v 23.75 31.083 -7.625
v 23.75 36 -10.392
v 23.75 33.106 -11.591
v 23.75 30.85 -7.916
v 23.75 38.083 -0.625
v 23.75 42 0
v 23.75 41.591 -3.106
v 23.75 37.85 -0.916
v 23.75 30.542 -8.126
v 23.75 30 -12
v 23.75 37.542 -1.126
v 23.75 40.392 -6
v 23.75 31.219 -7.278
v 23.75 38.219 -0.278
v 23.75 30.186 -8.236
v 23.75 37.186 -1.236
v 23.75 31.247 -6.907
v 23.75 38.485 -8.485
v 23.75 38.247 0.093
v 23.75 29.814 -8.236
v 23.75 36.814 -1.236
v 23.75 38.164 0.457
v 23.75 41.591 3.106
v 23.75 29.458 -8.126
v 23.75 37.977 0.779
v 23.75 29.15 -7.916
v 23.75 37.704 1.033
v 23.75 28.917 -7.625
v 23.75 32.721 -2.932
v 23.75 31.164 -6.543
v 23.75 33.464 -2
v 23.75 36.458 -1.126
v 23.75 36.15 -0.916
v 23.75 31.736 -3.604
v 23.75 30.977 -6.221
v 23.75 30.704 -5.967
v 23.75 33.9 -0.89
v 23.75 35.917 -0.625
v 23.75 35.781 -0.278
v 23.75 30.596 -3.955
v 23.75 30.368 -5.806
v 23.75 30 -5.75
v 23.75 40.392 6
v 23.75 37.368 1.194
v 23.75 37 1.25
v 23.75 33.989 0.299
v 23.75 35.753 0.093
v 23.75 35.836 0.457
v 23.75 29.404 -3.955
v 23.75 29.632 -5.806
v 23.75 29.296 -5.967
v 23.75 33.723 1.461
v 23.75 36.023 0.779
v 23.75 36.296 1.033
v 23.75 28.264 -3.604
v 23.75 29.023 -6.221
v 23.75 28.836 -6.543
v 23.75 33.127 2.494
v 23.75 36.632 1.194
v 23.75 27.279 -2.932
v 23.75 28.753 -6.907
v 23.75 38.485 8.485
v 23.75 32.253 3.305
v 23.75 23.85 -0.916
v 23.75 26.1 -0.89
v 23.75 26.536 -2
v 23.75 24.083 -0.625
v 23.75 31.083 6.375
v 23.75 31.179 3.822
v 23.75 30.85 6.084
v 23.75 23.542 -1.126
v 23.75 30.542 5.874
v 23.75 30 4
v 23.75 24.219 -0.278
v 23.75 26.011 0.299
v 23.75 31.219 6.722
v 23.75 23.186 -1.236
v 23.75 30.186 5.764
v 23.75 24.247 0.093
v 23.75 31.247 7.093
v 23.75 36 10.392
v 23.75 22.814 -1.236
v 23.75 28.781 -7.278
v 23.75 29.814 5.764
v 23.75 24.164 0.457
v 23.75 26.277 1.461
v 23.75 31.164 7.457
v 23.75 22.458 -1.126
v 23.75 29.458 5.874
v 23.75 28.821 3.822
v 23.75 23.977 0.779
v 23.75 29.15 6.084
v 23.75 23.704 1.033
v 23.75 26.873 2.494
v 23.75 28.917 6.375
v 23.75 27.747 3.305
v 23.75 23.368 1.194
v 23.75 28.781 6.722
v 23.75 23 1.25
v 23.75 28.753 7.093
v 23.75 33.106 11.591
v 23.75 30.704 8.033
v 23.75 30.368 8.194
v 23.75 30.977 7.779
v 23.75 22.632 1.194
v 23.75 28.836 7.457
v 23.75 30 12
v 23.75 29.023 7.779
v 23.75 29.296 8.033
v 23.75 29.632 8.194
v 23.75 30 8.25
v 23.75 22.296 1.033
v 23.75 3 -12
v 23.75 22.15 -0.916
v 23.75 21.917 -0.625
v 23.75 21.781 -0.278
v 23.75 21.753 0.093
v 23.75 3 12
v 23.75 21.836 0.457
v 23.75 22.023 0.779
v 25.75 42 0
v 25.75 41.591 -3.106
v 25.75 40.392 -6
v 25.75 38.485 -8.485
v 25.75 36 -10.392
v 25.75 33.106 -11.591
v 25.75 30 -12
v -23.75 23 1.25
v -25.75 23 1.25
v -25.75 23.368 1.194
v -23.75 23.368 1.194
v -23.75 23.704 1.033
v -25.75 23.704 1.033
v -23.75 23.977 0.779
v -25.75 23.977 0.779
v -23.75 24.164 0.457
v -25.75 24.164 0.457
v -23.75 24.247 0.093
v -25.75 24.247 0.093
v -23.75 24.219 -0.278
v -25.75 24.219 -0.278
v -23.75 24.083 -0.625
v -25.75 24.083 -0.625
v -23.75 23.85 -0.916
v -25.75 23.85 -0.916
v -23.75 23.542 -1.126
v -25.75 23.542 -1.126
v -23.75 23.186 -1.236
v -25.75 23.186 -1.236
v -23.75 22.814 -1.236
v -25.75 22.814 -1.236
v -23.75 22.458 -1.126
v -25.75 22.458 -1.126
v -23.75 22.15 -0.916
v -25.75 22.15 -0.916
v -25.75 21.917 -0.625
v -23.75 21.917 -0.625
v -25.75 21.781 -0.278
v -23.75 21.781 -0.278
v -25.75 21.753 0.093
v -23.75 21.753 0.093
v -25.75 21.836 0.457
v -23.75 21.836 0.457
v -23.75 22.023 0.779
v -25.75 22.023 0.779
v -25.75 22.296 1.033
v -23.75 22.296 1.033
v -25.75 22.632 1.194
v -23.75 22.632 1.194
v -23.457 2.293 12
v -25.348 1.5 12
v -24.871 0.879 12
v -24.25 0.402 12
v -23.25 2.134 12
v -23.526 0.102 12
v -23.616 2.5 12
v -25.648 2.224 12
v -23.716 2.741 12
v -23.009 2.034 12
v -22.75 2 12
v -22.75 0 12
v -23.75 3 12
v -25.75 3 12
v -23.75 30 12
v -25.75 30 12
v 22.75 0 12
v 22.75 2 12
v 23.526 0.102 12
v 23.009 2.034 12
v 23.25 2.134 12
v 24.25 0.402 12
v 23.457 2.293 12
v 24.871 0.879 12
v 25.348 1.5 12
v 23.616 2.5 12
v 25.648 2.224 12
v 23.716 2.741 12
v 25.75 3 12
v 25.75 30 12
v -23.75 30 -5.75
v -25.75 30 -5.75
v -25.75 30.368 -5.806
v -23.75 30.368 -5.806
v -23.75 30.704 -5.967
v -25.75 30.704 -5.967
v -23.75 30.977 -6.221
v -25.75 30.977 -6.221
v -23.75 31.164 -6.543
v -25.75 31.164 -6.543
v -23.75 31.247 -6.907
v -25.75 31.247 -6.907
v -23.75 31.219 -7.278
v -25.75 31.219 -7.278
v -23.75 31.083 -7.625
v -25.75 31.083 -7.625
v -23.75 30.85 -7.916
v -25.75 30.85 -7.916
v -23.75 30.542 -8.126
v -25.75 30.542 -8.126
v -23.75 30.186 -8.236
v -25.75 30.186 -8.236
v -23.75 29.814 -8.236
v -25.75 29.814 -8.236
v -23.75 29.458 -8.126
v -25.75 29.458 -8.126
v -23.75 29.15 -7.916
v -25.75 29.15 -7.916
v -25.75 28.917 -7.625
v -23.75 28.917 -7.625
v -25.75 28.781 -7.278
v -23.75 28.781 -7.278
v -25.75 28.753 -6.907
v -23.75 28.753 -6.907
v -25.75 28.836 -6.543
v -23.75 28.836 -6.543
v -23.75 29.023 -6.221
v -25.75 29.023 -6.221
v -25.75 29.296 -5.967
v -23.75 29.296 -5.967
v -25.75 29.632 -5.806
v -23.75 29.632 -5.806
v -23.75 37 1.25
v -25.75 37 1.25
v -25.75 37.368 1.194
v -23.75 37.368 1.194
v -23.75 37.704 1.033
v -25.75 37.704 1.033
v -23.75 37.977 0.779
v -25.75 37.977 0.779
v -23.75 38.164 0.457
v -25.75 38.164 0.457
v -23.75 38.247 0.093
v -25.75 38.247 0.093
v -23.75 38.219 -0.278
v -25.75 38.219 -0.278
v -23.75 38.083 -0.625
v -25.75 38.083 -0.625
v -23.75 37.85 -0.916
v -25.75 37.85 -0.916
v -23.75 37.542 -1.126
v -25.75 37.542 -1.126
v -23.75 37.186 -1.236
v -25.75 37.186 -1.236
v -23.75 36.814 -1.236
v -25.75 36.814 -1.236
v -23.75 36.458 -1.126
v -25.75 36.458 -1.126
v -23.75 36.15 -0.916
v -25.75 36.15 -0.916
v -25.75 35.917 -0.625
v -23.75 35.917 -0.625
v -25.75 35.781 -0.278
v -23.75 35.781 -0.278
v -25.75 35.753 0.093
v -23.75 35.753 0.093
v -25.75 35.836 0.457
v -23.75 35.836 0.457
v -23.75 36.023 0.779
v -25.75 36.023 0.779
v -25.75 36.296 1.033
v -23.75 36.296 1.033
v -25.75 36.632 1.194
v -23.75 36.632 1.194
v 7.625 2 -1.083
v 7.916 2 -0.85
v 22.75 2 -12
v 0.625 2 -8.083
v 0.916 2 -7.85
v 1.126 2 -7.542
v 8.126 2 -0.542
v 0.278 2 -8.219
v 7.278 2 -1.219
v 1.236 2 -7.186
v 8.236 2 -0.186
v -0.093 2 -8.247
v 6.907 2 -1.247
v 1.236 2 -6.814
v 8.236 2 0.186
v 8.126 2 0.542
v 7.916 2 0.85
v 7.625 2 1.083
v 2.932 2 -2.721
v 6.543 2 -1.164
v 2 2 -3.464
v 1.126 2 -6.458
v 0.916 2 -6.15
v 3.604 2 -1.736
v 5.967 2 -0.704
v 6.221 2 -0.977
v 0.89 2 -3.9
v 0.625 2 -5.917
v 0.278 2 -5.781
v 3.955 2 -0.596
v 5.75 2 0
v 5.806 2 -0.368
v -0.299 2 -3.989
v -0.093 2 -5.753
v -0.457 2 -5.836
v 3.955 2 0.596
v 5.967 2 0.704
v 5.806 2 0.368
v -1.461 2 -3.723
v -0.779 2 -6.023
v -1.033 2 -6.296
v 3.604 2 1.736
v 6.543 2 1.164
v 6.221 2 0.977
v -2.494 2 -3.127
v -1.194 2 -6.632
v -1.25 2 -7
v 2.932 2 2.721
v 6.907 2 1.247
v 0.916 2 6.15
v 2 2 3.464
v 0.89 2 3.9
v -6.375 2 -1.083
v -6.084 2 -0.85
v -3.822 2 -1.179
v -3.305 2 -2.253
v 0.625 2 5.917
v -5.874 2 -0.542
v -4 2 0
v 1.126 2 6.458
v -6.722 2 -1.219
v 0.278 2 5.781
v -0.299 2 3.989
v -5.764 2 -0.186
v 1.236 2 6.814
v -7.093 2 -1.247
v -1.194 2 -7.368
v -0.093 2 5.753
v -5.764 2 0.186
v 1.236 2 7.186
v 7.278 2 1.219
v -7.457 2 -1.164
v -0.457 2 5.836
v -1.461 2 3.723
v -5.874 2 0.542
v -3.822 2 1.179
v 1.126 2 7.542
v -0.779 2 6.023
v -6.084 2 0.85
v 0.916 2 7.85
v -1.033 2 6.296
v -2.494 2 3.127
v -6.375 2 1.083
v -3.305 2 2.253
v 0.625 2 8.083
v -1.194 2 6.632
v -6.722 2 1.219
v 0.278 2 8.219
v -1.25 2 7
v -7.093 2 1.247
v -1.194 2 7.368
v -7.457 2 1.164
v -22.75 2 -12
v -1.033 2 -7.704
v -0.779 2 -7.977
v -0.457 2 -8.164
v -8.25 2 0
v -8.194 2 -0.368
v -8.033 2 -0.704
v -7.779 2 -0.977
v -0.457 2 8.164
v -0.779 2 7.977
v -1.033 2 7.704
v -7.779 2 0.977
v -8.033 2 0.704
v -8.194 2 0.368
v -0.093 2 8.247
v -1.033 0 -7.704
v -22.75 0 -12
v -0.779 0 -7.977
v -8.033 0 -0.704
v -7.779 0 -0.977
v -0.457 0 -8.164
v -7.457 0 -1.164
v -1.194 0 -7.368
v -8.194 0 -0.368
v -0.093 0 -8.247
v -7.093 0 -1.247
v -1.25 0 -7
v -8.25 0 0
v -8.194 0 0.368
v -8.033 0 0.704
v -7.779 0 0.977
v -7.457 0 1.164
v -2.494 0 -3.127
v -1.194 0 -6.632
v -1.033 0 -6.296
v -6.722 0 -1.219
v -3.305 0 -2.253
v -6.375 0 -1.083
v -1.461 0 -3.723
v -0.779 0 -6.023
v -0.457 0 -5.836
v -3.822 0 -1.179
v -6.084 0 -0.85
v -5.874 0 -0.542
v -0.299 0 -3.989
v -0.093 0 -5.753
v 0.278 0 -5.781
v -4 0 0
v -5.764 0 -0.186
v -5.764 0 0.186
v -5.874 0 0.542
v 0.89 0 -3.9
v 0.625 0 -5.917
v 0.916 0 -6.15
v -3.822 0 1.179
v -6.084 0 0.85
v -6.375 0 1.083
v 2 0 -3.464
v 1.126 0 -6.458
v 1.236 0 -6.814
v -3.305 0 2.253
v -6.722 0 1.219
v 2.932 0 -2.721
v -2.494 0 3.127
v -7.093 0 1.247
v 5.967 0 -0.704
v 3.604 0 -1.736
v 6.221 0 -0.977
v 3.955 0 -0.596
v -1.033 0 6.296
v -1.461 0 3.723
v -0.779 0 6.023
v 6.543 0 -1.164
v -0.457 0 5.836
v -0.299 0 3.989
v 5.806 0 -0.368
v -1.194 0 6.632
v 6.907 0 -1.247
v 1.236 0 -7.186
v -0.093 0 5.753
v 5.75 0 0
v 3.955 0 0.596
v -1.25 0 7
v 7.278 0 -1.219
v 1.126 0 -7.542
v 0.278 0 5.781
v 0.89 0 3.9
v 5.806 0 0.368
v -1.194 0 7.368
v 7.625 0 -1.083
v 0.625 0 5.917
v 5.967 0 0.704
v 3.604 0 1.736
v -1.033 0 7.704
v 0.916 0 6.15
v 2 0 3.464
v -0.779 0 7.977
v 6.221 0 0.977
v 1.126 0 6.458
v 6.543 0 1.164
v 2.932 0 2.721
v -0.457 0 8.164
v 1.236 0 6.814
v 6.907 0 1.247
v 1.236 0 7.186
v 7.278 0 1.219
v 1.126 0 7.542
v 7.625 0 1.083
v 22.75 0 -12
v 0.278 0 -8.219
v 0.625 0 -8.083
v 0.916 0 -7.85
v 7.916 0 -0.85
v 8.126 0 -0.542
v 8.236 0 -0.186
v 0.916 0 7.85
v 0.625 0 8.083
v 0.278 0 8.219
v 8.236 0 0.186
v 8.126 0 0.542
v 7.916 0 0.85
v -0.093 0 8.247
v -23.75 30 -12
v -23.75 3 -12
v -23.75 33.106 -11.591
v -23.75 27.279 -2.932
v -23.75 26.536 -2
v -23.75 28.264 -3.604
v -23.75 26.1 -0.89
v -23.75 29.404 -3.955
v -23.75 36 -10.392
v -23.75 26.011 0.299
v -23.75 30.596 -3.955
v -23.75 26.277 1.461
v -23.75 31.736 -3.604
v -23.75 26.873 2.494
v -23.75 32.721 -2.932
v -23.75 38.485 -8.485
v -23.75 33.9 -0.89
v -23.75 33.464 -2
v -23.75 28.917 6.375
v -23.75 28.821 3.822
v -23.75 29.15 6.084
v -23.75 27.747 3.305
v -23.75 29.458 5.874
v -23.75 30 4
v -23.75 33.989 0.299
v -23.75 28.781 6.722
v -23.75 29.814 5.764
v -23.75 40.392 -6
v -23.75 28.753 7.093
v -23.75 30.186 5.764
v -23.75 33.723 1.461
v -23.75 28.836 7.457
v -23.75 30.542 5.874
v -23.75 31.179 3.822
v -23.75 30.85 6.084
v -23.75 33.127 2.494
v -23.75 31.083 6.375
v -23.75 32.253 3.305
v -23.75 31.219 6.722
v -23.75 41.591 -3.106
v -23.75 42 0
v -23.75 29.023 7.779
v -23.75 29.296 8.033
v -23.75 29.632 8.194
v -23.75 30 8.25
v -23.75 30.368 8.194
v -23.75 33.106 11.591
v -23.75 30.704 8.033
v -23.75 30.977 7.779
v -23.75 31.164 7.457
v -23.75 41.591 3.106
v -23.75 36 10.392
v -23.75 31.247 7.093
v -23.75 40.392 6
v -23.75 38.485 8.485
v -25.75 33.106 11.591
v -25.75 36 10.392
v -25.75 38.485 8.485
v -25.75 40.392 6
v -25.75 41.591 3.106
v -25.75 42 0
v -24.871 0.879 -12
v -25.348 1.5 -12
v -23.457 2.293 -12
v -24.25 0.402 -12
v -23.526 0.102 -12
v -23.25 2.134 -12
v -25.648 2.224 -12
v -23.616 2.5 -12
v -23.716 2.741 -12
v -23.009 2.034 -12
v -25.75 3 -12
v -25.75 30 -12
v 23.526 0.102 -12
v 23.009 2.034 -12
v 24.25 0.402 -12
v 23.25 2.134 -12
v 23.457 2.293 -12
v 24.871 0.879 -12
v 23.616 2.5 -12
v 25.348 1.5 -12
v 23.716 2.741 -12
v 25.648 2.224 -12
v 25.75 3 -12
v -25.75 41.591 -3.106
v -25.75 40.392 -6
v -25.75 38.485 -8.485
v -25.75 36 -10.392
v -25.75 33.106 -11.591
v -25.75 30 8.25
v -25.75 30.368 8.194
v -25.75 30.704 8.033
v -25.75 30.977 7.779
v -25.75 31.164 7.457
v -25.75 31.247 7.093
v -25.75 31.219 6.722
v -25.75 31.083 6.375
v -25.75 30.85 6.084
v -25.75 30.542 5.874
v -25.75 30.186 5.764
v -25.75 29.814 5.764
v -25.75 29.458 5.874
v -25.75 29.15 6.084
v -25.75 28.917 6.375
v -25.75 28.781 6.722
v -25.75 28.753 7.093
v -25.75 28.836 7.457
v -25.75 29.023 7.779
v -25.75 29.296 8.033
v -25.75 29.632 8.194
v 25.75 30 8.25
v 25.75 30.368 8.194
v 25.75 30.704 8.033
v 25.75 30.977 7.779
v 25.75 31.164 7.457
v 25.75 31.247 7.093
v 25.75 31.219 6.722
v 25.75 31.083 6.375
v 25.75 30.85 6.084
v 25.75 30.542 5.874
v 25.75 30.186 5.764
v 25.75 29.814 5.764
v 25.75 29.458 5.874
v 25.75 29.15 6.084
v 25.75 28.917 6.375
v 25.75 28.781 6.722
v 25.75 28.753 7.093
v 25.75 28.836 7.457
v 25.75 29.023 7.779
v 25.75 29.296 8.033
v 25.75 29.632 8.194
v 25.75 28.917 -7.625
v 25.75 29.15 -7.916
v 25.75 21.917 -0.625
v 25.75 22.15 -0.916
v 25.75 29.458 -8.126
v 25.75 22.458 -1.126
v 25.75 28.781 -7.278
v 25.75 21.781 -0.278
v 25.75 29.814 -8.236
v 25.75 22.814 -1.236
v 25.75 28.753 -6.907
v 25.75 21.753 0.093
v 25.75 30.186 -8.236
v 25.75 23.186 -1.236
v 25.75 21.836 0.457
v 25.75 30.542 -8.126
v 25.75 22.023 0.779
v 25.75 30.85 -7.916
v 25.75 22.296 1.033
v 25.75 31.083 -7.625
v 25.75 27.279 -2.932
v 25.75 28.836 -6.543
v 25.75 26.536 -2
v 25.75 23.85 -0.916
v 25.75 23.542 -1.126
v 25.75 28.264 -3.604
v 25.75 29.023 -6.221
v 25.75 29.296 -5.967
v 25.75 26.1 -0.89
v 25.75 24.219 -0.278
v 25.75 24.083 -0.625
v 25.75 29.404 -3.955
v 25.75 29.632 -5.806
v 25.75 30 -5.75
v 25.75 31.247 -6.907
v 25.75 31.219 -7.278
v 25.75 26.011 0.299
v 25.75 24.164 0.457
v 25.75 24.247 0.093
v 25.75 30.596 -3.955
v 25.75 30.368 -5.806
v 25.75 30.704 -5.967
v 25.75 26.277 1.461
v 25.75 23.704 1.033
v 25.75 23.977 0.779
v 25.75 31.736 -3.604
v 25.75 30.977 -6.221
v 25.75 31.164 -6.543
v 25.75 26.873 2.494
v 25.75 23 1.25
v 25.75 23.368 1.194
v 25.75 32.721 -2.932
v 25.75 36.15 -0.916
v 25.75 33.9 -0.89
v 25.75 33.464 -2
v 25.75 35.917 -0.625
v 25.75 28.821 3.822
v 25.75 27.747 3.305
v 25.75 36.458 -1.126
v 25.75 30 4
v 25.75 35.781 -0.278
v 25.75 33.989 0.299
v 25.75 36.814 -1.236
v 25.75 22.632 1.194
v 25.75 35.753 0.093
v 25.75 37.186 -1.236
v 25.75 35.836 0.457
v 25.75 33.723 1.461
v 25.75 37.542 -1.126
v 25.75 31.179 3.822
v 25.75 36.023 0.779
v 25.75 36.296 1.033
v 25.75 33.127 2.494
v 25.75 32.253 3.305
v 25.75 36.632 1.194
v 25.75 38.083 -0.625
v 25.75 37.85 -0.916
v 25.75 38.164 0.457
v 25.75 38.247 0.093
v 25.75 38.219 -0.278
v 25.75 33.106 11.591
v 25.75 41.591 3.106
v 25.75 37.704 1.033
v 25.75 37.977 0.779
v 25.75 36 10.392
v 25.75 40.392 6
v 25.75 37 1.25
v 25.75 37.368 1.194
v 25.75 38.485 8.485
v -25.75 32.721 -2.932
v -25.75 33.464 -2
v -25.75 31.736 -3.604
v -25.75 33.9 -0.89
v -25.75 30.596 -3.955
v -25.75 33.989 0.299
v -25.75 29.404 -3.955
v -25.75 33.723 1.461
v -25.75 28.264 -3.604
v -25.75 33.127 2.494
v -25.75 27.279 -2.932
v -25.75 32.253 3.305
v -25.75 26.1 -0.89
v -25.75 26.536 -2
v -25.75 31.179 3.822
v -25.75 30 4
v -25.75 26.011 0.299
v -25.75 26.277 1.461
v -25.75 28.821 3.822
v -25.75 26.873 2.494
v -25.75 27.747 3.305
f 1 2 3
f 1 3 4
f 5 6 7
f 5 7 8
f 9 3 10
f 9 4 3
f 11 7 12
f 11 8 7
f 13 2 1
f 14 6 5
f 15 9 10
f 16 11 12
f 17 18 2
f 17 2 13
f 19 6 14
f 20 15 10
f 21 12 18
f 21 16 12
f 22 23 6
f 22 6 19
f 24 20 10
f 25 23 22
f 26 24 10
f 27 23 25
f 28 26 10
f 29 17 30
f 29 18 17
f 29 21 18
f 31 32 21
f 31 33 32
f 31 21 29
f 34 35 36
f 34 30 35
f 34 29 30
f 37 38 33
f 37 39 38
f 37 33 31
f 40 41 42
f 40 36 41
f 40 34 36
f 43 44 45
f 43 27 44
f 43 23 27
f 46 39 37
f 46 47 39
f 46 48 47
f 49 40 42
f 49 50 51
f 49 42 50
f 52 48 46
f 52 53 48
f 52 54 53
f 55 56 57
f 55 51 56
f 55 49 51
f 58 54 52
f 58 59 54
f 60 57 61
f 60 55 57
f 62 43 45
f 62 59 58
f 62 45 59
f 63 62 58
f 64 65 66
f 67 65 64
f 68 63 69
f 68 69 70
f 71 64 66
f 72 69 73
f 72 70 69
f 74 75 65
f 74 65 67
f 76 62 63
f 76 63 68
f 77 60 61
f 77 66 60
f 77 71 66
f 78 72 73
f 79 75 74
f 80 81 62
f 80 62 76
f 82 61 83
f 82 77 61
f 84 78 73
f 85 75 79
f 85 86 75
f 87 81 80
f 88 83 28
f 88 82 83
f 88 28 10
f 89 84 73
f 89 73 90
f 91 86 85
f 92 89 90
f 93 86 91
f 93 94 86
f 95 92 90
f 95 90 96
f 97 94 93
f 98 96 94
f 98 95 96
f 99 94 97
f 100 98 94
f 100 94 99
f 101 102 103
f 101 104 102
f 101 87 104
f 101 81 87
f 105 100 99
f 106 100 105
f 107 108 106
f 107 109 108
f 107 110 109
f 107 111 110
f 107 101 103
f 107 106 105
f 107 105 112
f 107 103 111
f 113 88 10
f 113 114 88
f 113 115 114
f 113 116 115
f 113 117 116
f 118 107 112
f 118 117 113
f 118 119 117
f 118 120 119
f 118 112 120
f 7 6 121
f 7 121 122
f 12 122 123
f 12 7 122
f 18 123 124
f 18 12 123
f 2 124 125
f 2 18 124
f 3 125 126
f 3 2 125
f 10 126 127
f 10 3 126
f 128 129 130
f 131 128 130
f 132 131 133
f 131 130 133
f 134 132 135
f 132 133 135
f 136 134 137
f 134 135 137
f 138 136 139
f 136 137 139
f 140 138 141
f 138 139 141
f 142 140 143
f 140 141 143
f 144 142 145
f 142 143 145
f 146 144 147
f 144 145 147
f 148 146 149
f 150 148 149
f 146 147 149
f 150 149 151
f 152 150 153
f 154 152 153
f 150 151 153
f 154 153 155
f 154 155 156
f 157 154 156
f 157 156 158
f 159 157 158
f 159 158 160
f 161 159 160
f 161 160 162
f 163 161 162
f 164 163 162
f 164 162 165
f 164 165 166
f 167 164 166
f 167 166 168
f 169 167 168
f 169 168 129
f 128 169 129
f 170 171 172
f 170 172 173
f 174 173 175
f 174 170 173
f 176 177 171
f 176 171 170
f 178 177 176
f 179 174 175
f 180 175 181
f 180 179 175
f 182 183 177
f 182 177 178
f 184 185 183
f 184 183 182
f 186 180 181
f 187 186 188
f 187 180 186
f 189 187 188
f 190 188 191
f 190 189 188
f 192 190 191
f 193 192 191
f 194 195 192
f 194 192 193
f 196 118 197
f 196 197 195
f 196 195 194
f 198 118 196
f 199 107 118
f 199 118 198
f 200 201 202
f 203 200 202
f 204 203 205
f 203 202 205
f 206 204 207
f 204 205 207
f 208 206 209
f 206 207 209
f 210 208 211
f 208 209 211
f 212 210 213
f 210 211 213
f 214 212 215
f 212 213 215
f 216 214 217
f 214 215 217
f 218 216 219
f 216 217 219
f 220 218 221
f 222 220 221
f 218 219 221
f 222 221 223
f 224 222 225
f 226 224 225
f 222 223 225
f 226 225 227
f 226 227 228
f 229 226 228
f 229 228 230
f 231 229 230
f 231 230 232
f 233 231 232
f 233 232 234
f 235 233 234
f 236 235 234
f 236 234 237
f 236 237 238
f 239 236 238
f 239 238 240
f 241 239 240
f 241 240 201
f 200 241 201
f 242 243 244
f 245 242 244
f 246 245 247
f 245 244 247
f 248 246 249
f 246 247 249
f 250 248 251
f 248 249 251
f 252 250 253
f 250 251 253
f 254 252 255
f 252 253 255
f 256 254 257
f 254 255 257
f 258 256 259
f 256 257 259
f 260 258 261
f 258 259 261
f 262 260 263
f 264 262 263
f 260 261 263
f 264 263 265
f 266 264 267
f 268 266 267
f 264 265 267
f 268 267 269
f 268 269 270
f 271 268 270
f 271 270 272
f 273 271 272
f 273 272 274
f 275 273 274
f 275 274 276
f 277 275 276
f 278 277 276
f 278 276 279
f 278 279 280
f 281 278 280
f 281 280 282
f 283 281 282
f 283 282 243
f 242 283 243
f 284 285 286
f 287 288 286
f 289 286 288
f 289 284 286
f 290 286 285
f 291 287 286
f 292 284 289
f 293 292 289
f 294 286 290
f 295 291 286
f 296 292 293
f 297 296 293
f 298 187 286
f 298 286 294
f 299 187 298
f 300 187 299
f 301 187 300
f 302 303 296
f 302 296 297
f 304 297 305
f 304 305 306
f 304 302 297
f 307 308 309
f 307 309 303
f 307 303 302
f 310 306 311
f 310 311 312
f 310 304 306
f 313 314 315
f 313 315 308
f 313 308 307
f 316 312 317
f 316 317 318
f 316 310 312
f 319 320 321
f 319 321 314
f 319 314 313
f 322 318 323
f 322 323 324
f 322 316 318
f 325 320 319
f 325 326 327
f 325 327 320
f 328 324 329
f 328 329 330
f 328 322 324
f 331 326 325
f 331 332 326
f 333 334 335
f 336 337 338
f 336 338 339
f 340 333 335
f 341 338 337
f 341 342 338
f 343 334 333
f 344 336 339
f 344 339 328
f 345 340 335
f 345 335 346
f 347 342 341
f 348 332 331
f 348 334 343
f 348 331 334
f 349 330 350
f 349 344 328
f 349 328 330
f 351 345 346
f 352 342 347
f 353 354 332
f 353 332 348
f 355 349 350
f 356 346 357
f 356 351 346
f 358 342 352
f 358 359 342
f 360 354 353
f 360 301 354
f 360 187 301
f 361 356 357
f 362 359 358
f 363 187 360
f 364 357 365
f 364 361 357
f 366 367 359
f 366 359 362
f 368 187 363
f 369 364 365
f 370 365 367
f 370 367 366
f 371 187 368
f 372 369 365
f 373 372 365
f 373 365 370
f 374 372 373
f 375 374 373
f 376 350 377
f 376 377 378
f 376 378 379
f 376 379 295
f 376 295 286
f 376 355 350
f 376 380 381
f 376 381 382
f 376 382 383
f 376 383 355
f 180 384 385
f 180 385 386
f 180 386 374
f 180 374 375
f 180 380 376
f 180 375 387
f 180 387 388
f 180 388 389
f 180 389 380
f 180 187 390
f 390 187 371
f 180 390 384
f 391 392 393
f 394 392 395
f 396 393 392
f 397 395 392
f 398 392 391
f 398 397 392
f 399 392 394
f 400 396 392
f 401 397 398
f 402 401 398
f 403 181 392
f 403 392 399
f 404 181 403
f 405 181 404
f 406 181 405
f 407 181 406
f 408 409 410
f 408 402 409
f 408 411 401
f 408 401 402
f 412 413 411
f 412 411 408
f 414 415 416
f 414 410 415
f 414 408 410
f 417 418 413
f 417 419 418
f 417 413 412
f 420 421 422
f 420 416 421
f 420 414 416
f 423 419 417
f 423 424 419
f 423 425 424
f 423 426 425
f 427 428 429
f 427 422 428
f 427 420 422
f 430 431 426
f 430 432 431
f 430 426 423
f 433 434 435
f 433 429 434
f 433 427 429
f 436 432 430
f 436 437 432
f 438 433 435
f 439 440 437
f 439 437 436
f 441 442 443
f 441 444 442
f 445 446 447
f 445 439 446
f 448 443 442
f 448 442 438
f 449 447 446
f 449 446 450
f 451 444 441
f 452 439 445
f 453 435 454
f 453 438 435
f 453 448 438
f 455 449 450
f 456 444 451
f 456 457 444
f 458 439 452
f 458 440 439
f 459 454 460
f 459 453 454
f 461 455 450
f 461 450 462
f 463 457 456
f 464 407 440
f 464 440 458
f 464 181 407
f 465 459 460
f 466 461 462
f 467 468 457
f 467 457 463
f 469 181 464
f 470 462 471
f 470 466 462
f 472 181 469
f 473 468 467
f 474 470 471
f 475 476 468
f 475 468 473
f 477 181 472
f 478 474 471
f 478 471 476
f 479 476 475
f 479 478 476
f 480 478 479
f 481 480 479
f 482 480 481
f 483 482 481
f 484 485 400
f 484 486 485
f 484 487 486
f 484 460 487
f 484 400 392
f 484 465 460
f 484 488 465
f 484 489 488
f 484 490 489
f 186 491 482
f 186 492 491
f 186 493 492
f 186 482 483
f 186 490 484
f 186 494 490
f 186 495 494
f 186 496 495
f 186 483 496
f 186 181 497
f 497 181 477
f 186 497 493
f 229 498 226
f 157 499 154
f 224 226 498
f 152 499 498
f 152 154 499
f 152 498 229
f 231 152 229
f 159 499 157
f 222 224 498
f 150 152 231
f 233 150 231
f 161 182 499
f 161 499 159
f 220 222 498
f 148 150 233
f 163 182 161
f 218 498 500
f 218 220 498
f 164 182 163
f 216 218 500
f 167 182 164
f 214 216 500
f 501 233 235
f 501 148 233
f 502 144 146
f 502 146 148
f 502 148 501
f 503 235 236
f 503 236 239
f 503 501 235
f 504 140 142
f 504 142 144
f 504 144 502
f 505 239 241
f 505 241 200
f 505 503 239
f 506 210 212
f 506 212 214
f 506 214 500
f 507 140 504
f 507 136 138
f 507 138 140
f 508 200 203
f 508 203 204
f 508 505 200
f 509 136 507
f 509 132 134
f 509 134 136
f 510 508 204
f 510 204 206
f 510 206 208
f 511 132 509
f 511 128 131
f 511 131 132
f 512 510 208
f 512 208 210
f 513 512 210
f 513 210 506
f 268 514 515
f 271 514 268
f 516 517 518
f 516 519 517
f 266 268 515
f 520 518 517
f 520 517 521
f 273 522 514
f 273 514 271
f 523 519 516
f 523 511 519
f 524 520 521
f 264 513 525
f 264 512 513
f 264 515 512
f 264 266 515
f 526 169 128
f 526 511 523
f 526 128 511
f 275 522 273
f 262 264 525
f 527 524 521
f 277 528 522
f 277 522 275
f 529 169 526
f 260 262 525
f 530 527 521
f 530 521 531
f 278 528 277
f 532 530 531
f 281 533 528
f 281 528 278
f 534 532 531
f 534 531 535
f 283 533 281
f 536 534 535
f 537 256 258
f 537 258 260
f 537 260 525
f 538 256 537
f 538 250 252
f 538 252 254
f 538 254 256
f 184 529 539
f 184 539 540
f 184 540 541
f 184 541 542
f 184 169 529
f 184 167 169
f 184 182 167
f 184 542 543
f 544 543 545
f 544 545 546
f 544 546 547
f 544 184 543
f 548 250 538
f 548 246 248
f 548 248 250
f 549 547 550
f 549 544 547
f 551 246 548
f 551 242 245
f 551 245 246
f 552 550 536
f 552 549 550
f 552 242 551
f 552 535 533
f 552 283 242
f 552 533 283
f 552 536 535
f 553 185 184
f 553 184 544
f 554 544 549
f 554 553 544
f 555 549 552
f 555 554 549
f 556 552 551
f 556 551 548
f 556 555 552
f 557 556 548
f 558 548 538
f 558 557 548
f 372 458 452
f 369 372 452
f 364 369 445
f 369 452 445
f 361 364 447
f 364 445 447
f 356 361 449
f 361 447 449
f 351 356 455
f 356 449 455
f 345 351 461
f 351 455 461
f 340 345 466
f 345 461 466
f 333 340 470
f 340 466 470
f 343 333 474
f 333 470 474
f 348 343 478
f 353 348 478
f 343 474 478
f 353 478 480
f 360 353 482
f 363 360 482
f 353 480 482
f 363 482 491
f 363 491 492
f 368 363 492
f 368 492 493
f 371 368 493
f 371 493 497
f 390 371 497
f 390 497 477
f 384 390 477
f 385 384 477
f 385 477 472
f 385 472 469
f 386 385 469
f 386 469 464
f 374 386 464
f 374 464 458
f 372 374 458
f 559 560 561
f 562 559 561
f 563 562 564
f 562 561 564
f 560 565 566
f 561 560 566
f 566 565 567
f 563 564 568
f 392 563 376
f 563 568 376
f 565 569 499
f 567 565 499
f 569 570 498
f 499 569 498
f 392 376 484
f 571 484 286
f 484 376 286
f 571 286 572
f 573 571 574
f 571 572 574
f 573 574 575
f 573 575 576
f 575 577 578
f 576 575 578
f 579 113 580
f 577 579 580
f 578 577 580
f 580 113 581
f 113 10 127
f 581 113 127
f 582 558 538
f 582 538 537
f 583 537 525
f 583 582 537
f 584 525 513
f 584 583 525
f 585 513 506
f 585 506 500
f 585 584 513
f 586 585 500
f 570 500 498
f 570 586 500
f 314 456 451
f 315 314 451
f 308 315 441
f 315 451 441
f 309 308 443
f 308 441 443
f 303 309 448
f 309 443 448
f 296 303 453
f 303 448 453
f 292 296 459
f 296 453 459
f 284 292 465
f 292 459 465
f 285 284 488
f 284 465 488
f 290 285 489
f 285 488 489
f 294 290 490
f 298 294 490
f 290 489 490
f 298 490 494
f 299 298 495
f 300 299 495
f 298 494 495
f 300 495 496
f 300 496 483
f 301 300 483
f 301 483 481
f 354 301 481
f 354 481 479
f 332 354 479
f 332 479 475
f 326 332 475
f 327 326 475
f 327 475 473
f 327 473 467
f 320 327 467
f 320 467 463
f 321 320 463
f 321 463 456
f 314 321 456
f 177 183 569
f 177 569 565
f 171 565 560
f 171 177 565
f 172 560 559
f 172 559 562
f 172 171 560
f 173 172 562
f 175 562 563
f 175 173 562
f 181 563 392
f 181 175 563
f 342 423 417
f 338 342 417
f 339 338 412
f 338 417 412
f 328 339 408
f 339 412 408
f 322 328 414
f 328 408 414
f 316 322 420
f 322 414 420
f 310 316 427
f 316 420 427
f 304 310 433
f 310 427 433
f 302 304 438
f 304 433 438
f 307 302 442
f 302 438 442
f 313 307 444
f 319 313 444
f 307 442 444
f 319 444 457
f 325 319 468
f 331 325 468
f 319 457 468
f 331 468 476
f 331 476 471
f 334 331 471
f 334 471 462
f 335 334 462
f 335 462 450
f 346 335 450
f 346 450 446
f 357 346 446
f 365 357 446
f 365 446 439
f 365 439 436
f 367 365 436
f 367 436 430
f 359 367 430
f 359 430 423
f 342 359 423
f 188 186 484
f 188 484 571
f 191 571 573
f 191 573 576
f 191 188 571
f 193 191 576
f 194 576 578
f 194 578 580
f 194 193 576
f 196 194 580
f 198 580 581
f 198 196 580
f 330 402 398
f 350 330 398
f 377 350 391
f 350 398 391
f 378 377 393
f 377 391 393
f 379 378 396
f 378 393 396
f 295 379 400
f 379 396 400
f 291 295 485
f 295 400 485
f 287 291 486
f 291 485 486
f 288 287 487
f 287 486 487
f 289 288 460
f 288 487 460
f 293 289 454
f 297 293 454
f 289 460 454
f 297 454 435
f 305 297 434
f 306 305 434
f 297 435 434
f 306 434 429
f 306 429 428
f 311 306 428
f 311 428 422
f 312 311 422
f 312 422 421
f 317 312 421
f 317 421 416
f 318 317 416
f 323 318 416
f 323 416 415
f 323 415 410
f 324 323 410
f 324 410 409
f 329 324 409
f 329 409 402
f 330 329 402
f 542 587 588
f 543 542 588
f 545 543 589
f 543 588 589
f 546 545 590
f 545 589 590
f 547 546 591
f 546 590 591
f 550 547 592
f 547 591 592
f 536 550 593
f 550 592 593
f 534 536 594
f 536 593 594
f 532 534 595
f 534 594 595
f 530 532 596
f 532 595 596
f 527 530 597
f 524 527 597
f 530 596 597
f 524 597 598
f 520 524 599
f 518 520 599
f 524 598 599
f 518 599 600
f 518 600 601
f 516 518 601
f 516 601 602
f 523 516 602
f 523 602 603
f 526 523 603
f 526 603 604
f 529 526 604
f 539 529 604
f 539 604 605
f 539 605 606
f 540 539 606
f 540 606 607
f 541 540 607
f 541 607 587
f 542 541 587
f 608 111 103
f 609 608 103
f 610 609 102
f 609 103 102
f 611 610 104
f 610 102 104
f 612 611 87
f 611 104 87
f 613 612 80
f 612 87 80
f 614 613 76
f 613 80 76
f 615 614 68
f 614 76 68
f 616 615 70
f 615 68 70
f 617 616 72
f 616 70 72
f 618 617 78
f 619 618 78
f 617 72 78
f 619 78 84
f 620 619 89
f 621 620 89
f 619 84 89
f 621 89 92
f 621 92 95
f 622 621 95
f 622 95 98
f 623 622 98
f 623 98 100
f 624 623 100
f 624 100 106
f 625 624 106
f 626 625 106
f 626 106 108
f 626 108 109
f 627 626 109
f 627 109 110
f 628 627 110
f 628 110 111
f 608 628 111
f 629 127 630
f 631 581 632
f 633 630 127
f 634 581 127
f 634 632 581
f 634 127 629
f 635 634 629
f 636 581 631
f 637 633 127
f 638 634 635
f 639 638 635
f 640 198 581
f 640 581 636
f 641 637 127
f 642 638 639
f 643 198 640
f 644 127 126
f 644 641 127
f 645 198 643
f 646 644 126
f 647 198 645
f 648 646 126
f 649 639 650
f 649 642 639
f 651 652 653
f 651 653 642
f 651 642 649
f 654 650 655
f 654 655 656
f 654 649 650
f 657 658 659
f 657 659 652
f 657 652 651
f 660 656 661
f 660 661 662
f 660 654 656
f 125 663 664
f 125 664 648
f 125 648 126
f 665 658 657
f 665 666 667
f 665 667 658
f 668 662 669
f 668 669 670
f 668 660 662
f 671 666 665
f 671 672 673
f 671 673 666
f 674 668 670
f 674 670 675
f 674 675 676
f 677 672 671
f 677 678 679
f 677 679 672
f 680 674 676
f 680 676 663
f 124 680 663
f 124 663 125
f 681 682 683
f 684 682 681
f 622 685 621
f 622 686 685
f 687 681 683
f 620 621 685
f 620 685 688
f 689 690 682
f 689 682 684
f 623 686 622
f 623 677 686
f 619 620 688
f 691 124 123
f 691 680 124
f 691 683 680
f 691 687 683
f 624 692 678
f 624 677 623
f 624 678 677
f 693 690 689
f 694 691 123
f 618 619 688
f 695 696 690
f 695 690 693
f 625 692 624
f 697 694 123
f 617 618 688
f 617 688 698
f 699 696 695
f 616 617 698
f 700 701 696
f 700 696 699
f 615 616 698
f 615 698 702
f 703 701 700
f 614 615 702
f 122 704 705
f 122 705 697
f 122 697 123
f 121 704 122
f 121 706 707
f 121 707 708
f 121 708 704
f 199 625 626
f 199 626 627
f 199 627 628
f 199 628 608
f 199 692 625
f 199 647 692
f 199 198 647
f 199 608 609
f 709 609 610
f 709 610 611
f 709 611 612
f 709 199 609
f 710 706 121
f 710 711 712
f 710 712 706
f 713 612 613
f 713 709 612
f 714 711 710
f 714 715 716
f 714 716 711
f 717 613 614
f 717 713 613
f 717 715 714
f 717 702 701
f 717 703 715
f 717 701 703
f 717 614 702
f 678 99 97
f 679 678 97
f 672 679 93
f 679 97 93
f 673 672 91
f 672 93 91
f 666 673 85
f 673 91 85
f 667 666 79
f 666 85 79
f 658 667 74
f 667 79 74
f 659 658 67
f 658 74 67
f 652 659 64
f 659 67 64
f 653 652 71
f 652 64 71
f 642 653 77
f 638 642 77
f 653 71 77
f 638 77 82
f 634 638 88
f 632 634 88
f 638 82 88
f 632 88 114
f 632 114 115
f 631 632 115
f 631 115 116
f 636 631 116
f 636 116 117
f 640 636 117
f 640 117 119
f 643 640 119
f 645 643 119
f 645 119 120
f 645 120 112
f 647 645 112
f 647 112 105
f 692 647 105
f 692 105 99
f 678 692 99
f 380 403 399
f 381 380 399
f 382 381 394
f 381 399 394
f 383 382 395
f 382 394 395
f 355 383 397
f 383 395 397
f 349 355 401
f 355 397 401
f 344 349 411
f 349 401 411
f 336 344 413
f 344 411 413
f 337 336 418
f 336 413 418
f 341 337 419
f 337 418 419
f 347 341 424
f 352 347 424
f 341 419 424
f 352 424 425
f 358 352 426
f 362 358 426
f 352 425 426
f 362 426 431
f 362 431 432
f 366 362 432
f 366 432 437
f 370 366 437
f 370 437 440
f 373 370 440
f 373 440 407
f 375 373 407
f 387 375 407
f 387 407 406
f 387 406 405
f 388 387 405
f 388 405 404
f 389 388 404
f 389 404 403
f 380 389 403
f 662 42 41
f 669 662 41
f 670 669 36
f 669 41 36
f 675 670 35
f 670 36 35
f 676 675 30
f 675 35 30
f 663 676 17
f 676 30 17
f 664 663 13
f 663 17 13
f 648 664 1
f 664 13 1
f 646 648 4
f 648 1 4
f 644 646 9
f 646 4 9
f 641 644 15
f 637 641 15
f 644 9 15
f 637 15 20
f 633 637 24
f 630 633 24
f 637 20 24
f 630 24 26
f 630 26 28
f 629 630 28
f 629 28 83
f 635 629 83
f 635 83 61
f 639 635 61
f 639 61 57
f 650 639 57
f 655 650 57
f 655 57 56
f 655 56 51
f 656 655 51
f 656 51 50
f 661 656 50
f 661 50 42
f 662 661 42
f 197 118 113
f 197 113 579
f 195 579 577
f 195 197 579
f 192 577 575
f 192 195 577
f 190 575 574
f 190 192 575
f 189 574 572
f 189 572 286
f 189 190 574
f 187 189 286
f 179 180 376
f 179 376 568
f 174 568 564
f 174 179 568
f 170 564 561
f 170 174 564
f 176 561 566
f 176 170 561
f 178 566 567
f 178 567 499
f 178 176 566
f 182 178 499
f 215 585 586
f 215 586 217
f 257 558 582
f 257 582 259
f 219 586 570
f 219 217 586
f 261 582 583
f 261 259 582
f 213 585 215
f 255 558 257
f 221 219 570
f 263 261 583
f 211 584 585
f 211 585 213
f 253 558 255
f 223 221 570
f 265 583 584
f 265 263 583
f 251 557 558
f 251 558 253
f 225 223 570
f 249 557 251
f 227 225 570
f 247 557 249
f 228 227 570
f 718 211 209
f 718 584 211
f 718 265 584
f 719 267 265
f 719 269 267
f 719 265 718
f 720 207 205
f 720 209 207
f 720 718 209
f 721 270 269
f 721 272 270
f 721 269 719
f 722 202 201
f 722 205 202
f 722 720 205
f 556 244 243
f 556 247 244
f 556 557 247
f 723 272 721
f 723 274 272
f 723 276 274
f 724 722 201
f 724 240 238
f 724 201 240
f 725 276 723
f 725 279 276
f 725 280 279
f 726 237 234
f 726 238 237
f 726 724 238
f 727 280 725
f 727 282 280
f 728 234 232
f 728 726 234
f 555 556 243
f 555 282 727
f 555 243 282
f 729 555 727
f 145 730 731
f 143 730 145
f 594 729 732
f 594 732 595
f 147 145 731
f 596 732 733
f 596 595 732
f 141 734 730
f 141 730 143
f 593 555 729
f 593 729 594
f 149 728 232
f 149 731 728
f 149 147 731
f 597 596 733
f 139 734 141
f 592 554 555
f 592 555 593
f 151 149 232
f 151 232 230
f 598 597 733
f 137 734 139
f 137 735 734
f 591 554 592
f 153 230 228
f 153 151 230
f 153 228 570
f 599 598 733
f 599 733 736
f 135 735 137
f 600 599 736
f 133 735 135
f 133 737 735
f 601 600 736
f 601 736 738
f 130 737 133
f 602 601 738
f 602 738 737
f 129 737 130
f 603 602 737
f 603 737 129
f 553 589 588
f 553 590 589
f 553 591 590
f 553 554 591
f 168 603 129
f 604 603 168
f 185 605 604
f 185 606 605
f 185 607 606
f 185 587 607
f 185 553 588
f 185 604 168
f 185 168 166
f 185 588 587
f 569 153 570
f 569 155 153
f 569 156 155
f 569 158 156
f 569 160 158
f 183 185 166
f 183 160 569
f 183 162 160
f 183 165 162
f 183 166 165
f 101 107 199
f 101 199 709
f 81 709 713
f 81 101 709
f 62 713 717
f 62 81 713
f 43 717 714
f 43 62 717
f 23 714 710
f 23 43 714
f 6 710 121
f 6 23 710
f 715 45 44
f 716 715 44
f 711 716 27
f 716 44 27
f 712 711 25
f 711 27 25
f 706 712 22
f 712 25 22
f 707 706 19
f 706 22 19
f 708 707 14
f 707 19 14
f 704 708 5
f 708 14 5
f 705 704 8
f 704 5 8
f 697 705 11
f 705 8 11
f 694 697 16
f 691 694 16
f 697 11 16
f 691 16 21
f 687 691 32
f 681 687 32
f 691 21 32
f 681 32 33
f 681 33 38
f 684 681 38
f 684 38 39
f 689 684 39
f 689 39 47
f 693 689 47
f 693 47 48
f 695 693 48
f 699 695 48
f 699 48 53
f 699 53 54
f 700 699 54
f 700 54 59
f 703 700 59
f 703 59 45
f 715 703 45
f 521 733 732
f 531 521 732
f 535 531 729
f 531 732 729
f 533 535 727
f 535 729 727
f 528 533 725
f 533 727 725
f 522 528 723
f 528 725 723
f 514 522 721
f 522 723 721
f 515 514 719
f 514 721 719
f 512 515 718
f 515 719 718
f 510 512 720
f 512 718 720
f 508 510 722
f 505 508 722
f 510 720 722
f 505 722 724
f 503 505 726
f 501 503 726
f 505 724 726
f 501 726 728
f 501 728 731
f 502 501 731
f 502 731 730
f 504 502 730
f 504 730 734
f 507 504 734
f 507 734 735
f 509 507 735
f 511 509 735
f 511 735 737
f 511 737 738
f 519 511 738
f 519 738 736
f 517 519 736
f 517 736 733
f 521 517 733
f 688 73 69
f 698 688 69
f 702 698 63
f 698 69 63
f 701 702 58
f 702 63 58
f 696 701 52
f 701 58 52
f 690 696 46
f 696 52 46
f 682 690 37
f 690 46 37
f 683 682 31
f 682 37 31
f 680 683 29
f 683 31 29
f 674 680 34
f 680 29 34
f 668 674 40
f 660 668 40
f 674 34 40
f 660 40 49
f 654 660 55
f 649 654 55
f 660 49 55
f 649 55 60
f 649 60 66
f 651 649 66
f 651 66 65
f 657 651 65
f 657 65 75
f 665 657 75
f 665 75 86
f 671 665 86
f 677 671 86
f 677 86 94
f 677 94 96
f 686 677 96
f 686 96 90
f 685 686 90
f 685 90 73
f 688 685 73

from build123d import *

# Parameters (mm, degrees)
T_LE_DE_BASE_PLI_E1_DEPTH       = 12
ENL_V_START                     = -51.5
ENL_V_MAT_EXTRU_1_DEPTH         = 51.5
DIAM_TRE_DU_PER_AGE_8_0_8_1_D   = 8
DIAM_TRE_DU_PER_AGE_2_5_2_5_1_D = 2.5
DIAM_TRE_DU_PER_AGE_8_0_8_2_D   = 8
DIAM_TRE_DU_PER_AGE_2_5_2_5_2_D = 2.5


# Read off the part's stored shape, not the designer's step: Enlèv. mat.-Extru.1
# Sheet-metal steps are written as plain solids
with BuildPart() as part:
    # Esquisse1 → Tôle de base pliée1 (new, symmetric)
    with BuildSketch(Plane.XY):
        with BuildLine():
            Line((-25.75, 42), (-25.75, 3))
            ThreePointArc((-25.75, 3), (-24.871320344, 0.878679656), (-22.75, 0))
            Line((-22.75, 0), (22.75, 0))
            ThreePointArc((22.75, 0), (24.871320344, 0.878679656), (25.75, 3))
            Line((25.75, 3), (25.75, 42))
            Line((25.75, 42), (23.75, 42))
            Line((23.75, 42), (23.75, 3))
            ThreePointArc((23.75, 3), (23.457106781, 2.292893219), (22.75, 2))
            Line((22.75, 2), (-22.75, 2))
            ThreePointArc((-22.75, 2), (-23.457106781, 2.292893219), (-23.75, 3))
            Line((-23.75, 3), (-23.75, 42))
            Line((-23.75, 42), (-25.75, 42))
        make_face()
    extrude(amount=T_LE_DE_BASE_PLI_E1_DEPTH, both=True)

    # Enlèv. mat.-Extru.1 outline → Enlèv. mat.-Extru.1 (cut)
    with BuildSketch(Plane(origin=(25.75, 0, 0), x_dir=(0, 0, -1), z_dir=(1, 0, 0)).offset(ENL_V_START)):
        with BuildLine():
            ThreePointArc((-12, 30), (-8.485281374, 38.485281374), (0, 42))
            Line((0, 42), (-12, 42))
            Line((-12, 42), (-12, 30))
        make_face()
        with BuildLine():
            ThreePointArc((0, 42), (8.485281374, 38.485281374), (12, 30))
            Line((12, 30), (12, 42))
            Line((12, 42), (0, 42))
        make_face()
    extrude(amount=ENL_V_MAT_EXTRU_1_DEPTH, mode=Mode.SUBTRACT)

    # Diamètre du perçage Ø8.0 (8)1 (through all)
    with Locations(Plane(origin=(25.75, 0, 0), x_dir=(0, 0, -1), z_dir=(1, 0, 0))):
        with Locations((0, 30)):
            Hole(DIAM_TRE_DU_PER_AGE_8_0_8_1_D / 2)

    # Diamètre du perçage Ø2.5 (2.5)1 (through all)
    with Locations(Plane(origin=(25.75, 0, 0), x_dir=(0, 0, -1), z_dir=(1, 0, 0))):
        with Locations((-7, 30), (0, 37), (7, 30), (0, 23)):
            Hole(DIAM_TRE_DU_PER_AGE_2_5_2_5_1_D / 2)

    # Diamètre du perçage Ø8.0 (8)2 (through all)
    with Locations(Plane(origin=(0, 2, 0), x_dir=(1, 0, 0), z_dir=(0, 1, 0))):
        with Locations((0, 0)):
            Hole(DIAM_TRE_DU_PER_AGE_8_0_8_2_D / 2)

    # Diamètre du perçage Ø2.5 (2.5)2 (through all)
    with Locations(Plane(origin=(0, 2, 0), x_dir=(1, 0, 0), z_dir=(0, 1, 0))):
        with Locations((-7, 0), (0, 7), (7, 0), (0, -7)):
            Hole(DIAM_TRE_DU_PER_AGE_2_5_2_5_2_D / 2)


solid = part.part
